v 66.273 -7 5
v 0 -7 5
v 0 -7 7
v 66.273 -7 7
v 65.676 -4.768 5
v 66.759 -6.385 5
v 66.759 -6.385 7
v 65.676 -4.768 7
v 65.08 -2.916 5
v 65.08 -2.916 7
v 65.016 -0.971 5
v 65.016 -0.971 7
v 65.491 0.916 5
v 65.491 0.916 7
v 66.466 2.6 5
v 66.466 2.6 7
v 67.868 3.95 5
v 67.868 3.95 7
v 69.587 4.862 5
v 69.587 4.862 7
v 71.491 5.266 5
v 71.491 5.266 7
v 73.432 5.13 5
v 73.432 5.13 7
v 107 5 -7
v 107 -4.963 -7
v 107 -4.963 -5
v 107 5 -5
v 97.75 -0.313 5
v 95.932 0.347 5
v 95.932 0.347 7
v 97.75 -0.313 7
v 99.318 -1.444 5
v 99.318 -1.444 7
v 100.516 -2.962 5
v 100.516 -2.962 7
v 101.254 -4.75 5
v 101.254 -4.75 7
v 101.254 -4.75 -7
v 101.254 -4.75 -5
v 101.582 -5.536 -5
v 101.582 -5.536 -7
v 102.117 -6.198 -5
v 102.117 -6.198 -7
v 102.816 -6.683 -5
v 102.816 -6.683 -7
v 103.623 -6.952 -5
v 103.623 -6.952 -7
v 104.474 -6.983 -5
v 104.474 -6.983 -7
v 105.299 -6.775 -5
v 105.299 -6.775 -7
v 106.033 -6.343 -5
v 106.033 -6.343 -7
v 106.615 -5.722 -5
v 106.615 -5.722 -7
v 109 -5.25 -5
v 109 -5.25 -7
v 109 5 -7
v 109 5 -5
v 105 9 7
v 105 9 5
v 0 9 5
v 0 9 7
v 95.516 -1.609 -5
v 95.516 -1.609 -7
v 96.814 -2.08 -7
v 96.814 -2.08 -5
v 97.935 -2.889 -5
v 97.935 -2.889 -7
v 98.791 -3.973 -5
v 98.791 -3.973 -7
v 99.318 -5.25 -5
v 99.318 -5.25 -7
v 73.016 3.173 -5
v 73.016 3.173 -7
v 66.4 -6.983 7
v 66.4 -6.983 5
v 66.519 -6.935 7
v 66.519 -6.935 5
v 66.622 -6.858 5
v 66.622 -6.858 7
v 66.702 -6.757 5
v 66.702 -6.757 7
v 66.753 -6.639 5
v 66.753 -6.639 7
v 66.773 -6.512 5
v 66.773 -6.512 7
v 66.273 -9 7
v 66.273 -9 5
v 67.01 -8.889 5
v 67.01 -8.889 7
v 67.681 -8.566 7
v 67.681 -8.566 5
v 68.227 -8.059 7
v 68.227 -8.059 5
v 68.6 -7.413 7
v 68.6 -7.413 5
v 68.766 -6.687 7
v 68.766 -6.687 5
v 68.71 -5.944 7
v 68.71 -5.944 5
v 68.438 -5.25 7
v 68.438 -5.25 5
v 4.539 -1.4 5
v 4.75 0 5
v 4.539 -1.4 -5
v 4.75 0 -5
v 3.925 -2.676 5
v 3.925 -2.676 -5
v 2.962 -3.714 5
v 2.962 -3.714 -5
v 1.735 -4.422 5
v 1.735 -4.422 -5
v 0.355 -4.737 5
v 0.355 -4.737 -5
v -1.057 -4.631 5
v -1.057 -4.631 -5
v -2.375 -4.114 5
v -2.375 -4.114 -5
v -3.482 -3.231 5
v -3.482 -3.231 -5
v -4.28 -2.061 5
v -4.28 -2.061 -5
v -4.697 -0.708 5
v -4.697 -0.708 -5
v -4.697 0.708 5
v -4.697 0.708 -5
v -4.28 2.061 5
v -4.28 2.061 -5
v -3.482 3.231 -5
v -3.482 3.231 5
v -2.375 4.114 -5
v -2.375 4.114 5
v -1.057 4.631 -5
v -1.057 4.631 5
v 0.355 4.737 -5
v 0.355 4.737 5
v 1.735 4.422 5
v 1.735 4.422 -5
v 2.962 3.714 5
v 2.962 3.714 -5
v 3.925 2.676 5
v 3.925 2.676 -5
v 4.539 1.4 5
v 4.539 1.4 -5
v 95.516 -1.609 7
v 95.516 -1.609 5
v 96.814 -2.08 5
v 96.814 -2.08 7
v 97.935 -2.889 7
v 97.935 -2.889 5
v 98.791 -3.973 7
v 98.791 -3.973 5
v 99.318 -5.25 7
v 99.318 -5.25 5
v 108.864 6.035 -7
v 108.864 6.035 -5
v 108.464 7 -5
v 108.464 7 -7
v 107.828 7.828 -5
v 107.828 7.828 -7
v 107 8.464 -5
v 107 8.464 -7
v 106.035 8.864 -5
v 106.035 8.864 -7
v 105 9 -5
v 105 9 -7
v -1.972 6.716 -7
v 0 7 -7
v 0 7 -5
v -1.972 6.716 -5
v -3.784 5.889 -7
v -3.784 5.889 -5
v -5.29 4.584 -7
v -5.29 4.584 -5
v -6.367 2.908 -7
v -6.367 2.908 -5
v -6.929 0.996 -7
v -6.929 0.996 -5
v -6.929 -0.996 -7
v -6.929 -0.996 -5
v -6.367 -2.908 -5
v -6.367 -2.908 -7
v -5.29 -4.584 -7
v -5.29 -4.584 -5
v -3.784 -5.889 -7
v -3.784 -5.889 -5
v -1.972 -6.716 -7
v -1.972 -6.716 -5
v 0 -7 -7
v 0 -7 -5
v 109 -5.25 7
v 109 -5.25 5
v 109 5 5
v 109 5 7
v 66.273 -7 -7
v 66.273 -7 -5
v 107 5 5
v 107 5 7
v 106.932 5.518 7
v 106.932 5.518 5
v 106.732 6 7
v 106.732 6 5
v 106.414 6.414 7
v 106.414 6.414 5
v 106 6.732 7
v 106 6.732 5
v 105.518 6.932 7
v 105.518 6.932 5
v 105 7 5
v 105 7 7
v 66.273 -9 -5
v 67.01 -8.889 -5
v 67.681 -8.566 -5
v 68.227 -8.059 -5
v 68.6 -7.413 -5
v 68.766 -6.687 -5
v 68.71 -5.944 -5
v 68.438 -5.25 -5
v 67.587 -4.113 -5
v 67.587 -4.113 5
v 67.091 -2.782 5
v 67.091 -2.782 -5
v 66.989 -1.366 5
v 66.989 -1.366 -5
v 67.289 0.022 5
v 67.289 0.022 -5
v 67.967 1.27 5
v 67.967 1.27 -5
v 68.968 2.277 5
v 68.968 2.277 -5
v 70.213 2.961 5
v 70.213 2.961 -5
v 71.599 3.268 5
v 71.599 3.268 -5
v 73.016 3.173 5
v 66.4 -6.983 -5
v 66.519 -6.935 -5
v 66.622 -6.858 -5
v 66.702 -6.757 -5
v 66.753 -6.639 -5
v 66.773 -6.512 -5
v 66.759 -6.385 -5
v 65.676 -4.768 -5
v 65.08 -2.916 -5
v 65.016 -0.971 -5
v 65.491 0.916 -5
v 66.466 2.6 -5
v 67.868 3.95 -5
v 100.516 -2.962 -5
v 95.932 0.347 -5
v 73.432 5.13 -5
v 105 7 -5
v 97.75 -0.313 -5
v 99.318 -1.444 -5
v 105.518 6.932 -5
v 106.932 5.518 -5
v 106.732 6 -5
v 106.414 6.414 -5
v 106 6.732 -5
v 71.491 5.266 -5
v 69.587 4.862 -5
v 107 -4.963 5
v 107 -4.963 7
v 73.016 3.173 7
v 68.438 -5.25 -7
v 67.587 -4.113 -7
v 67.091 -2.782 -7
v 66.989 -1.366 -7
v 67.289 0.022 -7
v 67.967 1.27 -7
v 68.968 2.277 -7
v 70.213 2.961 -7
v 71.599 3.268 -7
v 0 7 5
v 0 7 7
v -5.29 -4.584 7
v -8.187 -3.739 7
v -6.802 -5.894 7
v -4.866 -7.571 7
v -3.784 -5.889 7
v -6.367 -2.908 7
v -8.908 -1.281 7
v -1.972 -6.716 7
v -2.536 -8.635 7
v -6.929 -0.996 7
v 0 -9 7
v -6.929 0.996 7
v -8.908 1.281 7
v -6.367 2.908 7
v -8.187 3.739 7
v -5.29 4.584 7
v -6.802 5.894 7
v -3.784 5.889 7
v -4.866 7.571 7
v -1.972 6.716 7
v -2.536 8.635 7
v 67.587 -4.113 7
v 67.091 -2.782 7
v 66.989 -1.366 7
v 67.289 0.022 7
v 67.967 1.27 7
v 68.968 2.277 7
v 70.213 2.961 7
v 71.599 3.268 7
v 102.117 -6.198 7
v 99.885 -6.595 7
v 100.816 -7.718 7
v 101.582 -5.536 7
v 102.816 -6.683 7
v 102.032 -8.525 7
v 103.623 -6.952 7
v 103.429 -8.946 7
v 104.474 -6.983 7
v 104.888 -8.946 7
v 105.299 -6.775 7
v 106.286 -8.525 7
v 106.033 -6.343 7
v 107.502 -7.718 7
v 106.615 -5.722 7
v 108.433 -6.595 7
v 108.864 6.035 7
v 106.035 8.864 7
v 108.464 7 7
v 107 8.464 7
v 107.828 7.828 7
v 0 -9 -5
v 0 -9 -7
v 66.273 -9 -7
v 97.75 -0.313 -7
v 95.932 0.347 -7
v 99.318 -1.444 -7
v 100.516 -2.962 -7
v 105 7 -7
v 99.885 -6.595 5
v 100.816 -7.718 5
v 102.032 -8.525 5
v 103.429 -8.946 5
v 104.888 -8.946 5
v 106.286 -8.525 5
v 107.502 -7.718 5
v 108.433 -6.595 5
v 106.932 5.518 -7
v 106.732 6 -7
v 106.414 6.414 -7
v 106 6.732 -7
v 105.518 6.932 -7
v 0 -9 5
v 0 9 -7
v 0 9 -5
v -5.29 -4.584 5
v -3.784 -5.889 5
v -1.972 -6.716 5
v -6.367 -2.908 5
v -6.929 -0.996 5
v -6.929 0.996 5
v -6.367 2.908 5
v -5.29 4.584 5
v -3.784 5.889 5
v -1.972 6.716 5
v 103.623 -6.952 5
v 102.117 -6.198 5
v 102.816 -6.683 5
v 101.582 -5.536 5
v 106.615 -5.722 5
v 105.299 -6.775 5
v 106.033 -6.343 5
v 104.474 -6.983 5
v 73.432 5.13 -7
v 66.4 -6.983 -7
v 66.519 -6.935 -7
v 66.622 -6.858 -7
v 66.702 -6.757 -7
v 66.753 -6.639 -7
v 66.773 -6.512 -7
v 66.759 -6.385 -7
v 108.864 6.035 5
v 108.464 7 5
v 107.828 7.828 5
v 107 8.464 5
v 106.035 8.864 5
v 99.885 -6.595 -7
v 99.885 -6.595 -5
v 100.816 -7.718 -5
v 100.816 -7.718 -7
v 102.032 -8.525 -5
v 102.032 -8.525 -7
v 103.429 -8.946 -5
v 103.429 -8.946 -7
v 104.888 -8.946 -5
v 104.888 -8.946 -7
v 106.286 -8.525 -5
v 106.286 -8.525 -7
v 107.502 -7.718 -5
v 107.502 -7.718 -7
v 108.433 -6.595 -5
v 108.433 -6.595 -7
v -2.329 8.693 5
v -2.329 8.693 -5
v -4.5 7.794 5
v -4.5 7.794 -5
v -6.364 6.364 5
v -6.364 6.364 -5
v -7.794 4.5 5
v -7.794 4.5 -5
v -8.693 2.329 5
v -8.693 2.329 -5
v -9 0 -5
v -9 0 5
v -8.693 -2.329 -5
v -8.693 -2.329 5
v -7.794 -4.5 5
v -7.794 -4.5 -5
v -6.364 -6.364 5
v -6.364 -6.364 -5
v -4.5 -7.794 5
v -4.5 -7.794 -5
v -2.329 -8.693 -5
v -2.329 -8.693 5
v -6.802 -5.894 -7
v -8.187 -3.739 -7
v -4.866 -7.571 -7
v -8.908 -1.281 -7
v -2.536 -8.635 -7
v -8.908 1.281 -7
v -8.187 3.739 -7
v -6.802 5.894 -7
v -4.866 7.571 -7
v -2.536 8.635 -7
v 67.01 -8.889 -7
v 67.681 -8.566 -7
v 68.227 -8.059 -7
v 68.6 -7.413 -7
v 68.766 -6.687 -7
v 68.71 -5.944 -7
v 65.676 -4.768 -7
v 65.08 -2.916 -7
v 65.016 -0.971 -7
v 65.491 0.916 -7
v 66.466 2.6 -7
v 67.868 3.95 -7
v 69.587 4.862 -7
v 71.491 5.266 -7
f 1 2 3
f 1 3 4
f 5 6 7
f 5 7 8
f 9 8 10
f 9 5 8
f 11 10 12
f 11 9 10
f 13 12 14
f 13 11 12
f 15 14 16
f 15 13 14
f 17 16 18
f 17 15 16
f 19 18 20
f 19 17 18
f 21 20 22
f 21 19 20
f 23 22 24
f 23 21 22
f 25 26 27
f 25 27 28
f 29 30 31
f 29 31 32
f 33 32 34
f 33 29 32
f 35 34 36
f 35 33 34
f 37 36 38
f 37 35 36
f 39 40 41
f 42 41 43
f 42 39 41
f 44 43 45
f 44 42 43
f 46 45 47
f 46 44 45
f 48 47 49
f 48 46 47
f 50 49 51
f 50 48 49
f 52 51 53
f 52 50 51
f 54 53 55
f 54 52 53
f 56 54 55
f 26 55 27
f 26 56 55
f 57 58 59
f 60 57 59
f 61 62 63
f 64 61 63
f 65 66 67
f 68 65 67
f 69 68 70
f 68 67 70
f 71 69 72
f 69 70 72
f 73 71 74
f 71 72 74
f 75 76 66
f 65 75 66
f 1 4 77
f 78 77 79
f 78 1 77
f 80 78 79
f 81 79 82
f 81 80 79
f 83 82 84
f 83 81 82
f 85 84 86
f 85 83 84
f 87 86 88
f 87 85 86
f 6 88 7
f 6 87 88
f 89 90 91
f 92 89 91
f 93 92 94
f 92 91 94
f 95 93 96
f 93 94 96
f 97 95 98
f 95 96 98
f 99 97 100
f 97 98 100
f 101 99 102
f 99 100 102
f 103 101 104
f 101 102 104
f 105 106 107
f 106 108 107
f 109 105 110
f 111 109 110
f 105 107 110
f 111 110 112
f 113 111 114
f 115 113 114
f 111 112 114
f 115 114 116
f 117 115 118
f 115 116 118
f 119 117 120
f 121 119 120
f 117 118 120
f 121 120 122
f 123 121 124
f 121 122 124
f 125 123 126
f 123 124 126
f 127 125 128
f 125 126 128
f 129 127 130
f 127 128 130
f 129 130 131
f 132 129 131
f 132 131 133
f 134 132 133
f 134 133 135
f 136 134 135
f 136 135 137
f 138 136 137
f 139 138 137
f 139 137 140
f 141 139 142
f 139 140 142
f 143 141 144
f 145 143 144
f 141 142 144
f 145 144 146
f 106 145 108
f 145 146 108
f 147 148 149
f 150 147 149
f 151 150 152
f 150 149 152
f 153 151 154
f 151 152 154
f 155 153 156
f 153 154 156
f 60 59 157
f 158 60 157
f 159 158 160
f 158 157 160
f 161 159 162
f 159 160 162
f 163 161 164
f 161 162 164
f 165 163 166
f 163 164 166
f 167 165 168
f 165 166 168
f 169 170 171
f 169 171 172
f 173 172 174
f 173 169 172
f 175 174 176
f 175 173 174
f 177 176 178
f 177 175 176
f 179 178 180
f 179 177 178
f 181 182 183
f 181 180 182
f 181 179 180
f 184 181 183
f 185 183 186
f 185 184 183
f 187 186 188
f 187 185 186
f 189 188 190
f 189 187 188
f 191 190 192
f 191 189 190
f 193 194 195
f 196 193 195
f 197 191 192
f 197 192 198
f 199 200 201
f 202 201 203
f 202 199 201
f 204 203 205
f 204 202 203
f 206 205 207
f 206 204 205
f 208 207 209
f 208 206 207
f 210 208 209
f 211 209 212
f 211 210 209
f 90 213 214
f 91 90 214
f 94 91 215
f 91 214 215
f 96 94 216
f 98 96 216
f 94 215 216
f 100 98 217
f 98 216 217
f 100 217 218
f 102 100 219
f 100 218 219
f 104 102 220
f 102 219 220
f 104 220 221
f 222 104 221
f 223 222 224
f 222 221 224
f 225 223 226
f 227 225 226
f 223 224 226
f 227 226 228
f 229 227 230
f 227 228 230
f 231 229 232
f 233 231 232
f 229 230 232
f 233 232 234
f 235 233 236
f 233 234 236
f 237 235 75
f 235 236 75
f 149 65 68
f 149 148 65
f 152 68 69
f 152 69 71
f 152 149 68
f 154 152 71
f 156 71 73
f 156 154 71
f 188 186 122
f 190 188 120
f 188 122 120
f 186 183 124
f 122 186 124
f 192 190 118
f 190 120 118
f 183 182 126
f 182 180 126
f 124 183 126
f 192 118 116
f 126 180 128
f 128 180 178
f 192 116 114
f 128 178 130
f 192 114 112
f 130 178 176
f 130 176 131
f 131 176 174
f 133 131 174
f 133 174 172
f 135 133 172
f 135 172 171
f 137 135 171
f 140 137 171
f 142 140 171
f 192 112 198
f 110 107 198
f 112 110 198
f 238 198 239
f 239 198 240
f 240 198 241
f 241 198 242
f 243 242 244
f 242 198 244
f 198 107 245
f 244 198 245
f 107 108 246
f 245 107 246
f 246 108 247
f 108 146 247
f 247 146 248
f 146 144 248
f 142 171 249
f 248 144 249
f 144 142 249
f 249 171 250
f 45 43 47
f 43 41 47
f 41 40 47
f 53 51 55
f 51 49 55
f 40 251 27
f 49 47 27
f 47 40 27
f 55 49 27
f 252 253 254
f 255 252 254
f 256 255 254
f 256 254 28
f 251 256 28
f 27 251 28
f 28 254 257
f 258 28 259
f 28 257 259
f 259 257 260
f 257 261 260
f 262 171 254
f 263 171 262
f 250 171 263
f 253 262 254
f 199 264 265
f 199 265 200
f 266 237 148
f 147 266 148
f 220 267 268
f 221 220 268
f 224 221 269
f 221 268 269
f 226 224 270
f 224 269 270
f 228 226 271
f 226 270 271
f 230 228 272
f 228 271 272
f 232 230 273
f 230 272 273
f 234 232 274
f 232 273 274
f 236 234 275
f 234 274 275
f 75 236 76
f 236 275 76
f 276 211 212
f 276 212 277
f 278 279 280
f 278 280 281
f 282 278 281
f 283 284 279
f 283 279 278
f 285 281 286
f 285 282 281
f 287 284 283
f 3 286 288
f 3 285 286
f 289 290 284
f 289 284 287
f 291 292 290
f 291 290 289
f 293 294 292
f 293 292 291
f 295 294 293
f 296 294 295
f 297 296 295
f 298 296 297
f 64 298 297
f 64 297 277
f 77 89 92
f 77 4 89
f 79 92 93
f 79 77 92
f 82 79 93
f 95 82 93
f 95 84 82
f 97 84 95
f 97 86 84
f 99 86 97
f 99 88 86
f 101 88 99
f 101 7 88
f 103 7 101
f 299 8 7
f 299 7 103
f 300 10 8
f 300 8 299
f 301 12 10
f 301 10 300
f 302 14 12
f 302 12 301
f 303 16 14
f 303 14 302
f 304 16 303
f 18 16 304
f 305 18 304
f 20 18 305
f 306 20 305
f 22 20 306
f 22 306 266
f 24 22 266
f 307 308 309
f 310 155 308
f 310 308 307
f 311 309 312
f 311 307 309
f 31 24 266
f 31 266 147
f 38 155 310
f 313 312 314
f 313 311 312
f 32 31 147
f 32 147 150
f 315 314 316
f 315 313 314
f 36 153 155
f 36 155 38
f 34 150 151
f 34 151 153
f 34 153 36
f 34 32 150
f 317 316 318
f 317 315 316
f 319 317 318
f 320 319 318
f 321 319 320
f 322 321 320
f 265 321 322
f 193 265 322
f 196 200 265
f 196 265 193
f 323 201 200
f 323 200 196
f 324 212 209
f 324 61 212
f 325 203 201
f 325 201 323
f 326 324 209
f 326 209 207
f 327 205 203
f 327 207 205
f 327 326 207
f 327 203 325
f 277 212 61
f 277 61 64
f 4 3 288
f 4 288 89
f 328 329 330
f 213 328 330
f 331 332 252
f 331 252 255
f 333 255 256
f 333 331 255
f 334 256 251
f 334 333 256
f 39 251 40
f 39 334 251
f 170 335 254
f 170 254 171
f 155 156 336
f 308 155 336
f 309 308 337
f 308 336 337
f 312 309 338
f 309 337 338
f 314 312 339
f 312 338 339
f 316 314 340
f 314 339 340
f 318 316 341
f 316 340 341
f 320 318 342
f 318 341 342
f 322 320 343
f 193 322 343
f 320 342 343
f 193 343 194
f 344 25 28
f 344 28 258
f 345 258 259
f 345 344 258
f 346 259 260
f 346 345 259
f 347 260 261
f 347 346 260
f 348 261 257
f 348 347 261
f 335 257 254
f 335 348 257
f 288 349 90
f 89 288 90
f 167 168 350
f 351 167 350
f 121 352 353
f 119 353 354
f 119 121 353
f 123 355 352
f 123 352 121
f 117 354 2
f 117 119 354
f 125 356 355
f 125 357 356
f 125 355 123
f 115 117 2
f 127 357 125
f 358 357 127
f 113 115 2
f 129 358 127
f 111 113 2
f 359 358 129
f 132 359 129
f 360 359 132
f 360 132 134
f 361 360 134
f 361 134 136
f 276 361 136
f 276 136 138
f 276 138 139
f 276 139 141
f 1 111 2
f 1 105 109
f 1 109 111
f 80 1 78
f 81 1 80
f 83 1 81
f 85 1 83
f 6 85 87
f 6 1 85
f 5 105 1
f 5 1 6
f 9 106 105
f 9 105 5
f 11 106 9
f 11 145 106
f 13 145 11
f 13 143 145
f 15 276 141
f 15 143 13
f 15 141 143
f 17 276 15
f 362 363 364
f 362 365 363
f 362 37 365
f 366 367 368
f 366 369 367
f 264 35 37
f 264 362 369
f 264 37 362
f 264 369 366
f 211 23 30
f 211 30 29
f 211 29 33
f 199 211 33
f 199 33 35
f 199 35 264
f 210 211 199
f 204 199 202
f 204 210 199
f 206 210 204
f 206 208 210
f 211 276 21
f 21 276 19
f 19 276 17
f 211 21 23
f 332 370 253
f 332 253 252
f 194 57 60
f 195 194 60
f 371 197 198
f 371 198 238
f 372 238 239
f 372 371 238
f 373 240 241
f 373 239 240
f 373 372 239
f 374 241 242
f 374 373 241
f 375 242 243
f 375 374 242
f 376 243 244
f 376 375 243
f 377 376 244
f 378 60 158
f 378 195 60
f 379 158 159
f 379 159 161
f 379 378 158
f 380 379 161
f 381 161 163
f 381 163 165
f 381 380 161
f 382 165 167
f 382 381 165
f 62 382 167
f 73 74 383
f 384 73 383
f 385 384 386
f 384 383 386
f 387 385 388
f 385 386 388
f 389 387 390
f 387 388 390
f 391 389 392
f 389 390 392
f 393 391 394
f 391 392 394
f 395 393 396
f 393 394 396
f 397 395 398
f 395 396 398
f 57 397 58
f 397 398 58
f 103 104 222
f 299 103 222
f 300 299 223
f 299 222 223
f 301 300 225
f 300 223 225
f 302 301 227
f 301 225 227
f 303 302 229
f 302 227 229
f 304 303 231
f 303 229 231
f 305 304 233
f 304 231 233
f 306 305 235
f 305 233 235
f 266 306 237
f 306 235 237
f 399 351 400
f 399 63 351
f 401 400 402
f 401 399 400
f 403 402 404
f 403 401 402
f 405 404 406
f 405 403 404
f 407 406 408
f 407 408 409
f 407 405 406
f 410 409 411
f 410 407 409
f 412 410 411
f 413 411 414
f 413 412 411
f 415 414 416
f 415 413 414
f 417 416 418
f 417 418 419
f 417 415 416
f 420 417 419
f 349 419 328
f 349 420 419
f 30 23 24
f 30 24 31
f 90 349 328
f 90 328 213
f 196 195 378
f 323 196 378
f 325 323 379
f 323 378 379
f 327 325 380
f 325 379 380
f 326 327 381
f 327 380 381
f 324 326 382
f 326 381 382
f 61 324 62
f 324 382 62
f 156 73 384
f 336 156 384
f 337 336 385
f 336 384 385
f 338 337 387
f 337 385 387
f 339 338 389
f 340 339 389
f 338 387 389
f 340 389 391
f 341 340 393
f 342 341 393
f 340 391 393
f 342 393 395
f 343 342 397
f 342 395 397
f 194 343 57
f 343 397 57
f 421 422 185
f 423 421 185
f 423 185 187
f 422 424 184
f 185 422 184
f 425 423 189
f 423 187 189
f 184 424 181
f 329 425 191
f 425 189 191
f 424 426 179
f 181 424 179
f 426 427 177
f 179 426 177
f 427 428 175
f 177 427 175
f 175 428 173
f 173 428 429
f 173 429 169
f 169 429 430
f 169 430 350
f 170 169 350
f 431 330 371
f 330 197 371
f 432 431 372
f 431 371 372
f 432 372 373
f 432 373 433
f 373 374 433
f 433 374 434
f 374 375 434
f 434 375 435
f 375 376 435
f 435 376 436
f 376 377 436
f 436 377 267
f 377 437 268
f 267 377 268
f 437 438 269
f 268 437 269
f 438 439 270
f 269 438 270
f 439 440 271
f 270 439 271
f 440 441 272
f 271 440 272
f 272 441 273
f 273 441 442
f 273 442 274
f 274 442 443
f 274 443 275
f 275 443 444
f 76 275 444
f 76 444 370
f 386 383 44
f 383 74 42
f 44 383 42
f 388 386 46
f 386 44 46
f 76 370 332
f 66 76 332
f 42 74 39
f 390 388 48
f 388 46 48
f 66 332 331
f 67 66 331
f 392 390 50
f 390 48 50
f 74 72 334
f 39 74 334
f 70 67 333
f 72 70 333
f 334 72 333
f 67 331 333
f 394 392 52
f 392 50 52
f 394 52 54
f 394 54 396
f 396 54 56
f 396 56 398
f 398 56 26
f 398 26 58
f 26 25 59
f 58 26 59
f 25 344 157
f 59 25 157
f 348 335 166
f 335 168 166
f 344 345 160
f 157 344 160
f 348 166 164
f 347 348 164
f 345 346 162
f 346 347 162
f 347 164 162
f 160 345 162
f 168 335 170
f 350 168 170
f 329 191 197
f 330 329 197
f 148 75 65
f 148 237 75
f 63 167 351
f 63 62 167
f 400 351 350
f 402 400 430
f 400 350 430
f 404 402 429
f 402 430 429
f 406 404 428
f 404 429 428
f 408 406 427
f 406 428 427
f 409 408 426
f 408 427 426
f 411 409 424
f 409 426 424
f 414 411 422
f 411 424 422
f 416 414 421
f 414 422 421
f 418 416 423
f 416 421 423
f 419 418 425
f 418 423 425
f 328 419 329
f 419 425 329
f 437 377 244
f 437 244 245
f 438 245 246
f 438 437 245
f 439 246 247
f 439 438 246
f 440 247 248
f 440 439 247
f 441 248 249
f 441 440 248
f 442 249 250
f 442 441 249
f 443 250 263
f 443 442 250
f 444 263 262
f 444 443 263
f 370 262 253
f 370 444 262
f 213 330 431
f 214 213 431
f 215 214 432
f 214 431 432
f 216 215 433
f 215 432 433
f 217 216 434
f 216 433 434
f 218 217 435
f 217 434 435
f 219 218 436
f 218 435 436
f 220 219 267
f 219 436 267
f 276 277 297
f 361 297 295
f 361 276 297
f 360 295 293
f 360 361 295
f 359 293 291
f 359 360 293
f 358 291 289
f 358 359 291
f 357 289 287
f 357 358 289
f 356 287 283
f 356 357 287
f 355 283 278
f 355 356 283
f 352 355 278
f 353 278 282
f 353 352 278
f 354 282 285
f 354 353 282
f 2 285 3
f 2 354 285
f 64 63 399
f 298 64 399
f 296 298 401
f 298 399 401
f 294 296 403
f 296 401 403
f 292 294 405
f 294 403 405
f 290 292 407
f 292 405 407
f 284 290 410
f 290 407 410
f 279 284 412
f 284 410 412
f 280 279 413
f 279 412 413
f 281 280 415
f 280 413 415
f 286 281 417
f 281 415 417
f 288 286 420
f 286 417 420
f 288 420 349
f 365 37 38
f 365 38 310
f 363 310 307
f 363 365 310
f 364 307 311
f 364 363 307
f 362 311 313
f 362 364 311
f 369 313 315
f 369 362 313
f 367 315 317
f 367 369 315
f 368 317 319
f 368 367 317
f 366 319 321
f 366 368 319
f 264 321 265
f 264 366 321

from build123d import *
from build123d.topology import SkipClean

# Parameters (mm, degrees)
BOSS_EXTRUDE1_DEPTH = 5
BOSS_EXTRUDE2_START = -12
BOSS_EXTRUDE2_DEPTH = 14


with BuildPart() as part:
    # Sketch1 → Boss-Extrude1 (new, symmetric)
    with SkipClean():  # the faces are left unmerged after this step: merging them gives an invalid solid
        with BuildSketch(Plane.XY):
            with BuildLine():
                ThreePointArc((9, 0), (6.363961031, -6.363961031), (0, -9))
                Line((0, -9), (66.272706331, -9))
                ThreePointArc((66.272706331, -9), (68.43776984, -7.75), (68.43776984, -5.25))
                ThreePointArc((68.43776984, -5.25), (67.583242863, 0.670186682), (73.015870906, 3.173260641))
                Line((73.015870906, 3.173260641), (95.515870906, -1.609261996))
                ThreePointArc((95.515870906, -1.609261996), (97.934586459, -2.888858783), (99.317541634, -5.25))
                ThreePointArc((99.317541634, -5.25), (104.158770817, -9), (109, -5.25))
                Line((109, -5.25), (109, 5))
                ThreePointArc((109, 5), (107.828427125, 7.828427125), (105, 9))
                Line((105, 9), (0, 9))
                ThreePointArc((0, 9), (6.363961031, 6.363961031), (9, 0))
            make_face()
            with BuildLine():
                ThreePointArc((-9, 0), (-6.363961031, -6.363961031), (0, -9))
                ThreePointArc((0, -9), (6.363961031, -6.363961031), (9, 0))
                Line((9, 0), (4.75, 0))
                ThreePointArc((4.75, 0), (0, -4.75), (-4.75, 0))
                Line((-4.75, 0), (-9, 0))
            make_face()
            with BuildLine():
                ThreePointArc((0, 9), (-6.363961031, 6.363961031), (-9, 0))
                Line((-9, 0), (-4.75, 0))
                ThreePointArc((-4.75, 0), (0, 4.75), (4.75, 0))
                Line((4.75, 0), (9, 0))
                ThreePointArc((9, 0), (6.363961031, 6.363961031), (0, 9))
            make_face()
            with BuildLine():
                ThreePointArc((-9, 0), (-6.363961031, -6.363961031), (0, -9))
                ThreePointArc((0, -9), (6.363961031, -6.363961031), (9, 0))
                Line((9, 0), (4.75, 0))
                ThreePointArc((4.75, 0), (0, -4.75), (-4.75, 0))
                Line((-4.75, 0), (-9, 0))
            make_face()
            with BuildLine():
                ThreePointArc((0, 9), (-6.363961031, 6.363961031), (-9, 0))
                Line((-9, 0), (-4.75, 0))
                ThreePointArc((-4.75, 0), (0, 4.75), (4.75, 0))
                Line((4.75, 0), (9, 0))
                ThreePointArc((9, 0), (6.363961031, 6.363961031), (0, 9))
            make_face()
        extrude(amount=BOSS_EXTRUDE1_DEPTH, both=True)

    # Sketch2 → Boss-Extrude2 (add)
    with SkipClean():  # the faces are left unmerged after this step: merging them gives an invalid solid
        with BuildSketch(Plane.XY.offset(5).offset(BOSS_EXTRUDE2_START)):
            with BuildLine():
                Line((105, 9), (0, 9))
                ThreePointArc((0, 9), (-9, 0), (0, -9))
                Line((0, -9), (66.272706331, -9))
                ThreePointArc((66.272706331, -9), (68.43776984, -7.75), (68.43776984, -5.25))
                ThreePointArc((68.43776984, -5.25), (67.583242863, 0.670186682), (73.015870906, 3.173260641))
                Line((73.015870906, 3.173260641), (95.515870906, -1.609261996))
                ThreePointArc((95.515870906, -1.609261996), (97.934586459, -2.888858783), (99.317541634, -5.25))
                ThreePointArc((99.317541634, -5.25), (104.158770817, -9), (109, -5.25))
                Line((109, -5.25), (109, 5))
                ThreePointArc((109, 5), (107.828427125, 7.828427125), (105, 9))
            make_face()
            with BuildLine():
                Line((105, 7), (0, 7))
                ThreePointArc((0, 7), (-7, 0), (0, -7))
                Line((0, -7), (66.272706331, -7))
                ThreePointArc((66.272706331, -7), (66.664953896, -6.810067489), (66.7591992, -6.38456739))
                ThreePointArc((66.7591992, -6.38456739), (65.919794123, 1.792306924), (73.431694287, 5.129555843))
                Line((73.431694287, 5.129555843), (95.931694287, 0.347033205))
                ThreePointArc((95.931694287, 0.347033205), (99.317896062, -1.444402296), (101.254033308, -4.75))
                ThreePointArc((101.254033308, -4.75), (104.047625793, -6.997940424), (107, -4.963024782))
                Line((107, -4.963024782), (107, 5))
                ThreePointArc((107, 5), (106.414213562, 6.414213562), (105, 7))
            make_face(mode=Mode.SUBTRACT)
        extrude(amount=BOSS_EXTRUDE2_DEPTH)


solid = part.part
